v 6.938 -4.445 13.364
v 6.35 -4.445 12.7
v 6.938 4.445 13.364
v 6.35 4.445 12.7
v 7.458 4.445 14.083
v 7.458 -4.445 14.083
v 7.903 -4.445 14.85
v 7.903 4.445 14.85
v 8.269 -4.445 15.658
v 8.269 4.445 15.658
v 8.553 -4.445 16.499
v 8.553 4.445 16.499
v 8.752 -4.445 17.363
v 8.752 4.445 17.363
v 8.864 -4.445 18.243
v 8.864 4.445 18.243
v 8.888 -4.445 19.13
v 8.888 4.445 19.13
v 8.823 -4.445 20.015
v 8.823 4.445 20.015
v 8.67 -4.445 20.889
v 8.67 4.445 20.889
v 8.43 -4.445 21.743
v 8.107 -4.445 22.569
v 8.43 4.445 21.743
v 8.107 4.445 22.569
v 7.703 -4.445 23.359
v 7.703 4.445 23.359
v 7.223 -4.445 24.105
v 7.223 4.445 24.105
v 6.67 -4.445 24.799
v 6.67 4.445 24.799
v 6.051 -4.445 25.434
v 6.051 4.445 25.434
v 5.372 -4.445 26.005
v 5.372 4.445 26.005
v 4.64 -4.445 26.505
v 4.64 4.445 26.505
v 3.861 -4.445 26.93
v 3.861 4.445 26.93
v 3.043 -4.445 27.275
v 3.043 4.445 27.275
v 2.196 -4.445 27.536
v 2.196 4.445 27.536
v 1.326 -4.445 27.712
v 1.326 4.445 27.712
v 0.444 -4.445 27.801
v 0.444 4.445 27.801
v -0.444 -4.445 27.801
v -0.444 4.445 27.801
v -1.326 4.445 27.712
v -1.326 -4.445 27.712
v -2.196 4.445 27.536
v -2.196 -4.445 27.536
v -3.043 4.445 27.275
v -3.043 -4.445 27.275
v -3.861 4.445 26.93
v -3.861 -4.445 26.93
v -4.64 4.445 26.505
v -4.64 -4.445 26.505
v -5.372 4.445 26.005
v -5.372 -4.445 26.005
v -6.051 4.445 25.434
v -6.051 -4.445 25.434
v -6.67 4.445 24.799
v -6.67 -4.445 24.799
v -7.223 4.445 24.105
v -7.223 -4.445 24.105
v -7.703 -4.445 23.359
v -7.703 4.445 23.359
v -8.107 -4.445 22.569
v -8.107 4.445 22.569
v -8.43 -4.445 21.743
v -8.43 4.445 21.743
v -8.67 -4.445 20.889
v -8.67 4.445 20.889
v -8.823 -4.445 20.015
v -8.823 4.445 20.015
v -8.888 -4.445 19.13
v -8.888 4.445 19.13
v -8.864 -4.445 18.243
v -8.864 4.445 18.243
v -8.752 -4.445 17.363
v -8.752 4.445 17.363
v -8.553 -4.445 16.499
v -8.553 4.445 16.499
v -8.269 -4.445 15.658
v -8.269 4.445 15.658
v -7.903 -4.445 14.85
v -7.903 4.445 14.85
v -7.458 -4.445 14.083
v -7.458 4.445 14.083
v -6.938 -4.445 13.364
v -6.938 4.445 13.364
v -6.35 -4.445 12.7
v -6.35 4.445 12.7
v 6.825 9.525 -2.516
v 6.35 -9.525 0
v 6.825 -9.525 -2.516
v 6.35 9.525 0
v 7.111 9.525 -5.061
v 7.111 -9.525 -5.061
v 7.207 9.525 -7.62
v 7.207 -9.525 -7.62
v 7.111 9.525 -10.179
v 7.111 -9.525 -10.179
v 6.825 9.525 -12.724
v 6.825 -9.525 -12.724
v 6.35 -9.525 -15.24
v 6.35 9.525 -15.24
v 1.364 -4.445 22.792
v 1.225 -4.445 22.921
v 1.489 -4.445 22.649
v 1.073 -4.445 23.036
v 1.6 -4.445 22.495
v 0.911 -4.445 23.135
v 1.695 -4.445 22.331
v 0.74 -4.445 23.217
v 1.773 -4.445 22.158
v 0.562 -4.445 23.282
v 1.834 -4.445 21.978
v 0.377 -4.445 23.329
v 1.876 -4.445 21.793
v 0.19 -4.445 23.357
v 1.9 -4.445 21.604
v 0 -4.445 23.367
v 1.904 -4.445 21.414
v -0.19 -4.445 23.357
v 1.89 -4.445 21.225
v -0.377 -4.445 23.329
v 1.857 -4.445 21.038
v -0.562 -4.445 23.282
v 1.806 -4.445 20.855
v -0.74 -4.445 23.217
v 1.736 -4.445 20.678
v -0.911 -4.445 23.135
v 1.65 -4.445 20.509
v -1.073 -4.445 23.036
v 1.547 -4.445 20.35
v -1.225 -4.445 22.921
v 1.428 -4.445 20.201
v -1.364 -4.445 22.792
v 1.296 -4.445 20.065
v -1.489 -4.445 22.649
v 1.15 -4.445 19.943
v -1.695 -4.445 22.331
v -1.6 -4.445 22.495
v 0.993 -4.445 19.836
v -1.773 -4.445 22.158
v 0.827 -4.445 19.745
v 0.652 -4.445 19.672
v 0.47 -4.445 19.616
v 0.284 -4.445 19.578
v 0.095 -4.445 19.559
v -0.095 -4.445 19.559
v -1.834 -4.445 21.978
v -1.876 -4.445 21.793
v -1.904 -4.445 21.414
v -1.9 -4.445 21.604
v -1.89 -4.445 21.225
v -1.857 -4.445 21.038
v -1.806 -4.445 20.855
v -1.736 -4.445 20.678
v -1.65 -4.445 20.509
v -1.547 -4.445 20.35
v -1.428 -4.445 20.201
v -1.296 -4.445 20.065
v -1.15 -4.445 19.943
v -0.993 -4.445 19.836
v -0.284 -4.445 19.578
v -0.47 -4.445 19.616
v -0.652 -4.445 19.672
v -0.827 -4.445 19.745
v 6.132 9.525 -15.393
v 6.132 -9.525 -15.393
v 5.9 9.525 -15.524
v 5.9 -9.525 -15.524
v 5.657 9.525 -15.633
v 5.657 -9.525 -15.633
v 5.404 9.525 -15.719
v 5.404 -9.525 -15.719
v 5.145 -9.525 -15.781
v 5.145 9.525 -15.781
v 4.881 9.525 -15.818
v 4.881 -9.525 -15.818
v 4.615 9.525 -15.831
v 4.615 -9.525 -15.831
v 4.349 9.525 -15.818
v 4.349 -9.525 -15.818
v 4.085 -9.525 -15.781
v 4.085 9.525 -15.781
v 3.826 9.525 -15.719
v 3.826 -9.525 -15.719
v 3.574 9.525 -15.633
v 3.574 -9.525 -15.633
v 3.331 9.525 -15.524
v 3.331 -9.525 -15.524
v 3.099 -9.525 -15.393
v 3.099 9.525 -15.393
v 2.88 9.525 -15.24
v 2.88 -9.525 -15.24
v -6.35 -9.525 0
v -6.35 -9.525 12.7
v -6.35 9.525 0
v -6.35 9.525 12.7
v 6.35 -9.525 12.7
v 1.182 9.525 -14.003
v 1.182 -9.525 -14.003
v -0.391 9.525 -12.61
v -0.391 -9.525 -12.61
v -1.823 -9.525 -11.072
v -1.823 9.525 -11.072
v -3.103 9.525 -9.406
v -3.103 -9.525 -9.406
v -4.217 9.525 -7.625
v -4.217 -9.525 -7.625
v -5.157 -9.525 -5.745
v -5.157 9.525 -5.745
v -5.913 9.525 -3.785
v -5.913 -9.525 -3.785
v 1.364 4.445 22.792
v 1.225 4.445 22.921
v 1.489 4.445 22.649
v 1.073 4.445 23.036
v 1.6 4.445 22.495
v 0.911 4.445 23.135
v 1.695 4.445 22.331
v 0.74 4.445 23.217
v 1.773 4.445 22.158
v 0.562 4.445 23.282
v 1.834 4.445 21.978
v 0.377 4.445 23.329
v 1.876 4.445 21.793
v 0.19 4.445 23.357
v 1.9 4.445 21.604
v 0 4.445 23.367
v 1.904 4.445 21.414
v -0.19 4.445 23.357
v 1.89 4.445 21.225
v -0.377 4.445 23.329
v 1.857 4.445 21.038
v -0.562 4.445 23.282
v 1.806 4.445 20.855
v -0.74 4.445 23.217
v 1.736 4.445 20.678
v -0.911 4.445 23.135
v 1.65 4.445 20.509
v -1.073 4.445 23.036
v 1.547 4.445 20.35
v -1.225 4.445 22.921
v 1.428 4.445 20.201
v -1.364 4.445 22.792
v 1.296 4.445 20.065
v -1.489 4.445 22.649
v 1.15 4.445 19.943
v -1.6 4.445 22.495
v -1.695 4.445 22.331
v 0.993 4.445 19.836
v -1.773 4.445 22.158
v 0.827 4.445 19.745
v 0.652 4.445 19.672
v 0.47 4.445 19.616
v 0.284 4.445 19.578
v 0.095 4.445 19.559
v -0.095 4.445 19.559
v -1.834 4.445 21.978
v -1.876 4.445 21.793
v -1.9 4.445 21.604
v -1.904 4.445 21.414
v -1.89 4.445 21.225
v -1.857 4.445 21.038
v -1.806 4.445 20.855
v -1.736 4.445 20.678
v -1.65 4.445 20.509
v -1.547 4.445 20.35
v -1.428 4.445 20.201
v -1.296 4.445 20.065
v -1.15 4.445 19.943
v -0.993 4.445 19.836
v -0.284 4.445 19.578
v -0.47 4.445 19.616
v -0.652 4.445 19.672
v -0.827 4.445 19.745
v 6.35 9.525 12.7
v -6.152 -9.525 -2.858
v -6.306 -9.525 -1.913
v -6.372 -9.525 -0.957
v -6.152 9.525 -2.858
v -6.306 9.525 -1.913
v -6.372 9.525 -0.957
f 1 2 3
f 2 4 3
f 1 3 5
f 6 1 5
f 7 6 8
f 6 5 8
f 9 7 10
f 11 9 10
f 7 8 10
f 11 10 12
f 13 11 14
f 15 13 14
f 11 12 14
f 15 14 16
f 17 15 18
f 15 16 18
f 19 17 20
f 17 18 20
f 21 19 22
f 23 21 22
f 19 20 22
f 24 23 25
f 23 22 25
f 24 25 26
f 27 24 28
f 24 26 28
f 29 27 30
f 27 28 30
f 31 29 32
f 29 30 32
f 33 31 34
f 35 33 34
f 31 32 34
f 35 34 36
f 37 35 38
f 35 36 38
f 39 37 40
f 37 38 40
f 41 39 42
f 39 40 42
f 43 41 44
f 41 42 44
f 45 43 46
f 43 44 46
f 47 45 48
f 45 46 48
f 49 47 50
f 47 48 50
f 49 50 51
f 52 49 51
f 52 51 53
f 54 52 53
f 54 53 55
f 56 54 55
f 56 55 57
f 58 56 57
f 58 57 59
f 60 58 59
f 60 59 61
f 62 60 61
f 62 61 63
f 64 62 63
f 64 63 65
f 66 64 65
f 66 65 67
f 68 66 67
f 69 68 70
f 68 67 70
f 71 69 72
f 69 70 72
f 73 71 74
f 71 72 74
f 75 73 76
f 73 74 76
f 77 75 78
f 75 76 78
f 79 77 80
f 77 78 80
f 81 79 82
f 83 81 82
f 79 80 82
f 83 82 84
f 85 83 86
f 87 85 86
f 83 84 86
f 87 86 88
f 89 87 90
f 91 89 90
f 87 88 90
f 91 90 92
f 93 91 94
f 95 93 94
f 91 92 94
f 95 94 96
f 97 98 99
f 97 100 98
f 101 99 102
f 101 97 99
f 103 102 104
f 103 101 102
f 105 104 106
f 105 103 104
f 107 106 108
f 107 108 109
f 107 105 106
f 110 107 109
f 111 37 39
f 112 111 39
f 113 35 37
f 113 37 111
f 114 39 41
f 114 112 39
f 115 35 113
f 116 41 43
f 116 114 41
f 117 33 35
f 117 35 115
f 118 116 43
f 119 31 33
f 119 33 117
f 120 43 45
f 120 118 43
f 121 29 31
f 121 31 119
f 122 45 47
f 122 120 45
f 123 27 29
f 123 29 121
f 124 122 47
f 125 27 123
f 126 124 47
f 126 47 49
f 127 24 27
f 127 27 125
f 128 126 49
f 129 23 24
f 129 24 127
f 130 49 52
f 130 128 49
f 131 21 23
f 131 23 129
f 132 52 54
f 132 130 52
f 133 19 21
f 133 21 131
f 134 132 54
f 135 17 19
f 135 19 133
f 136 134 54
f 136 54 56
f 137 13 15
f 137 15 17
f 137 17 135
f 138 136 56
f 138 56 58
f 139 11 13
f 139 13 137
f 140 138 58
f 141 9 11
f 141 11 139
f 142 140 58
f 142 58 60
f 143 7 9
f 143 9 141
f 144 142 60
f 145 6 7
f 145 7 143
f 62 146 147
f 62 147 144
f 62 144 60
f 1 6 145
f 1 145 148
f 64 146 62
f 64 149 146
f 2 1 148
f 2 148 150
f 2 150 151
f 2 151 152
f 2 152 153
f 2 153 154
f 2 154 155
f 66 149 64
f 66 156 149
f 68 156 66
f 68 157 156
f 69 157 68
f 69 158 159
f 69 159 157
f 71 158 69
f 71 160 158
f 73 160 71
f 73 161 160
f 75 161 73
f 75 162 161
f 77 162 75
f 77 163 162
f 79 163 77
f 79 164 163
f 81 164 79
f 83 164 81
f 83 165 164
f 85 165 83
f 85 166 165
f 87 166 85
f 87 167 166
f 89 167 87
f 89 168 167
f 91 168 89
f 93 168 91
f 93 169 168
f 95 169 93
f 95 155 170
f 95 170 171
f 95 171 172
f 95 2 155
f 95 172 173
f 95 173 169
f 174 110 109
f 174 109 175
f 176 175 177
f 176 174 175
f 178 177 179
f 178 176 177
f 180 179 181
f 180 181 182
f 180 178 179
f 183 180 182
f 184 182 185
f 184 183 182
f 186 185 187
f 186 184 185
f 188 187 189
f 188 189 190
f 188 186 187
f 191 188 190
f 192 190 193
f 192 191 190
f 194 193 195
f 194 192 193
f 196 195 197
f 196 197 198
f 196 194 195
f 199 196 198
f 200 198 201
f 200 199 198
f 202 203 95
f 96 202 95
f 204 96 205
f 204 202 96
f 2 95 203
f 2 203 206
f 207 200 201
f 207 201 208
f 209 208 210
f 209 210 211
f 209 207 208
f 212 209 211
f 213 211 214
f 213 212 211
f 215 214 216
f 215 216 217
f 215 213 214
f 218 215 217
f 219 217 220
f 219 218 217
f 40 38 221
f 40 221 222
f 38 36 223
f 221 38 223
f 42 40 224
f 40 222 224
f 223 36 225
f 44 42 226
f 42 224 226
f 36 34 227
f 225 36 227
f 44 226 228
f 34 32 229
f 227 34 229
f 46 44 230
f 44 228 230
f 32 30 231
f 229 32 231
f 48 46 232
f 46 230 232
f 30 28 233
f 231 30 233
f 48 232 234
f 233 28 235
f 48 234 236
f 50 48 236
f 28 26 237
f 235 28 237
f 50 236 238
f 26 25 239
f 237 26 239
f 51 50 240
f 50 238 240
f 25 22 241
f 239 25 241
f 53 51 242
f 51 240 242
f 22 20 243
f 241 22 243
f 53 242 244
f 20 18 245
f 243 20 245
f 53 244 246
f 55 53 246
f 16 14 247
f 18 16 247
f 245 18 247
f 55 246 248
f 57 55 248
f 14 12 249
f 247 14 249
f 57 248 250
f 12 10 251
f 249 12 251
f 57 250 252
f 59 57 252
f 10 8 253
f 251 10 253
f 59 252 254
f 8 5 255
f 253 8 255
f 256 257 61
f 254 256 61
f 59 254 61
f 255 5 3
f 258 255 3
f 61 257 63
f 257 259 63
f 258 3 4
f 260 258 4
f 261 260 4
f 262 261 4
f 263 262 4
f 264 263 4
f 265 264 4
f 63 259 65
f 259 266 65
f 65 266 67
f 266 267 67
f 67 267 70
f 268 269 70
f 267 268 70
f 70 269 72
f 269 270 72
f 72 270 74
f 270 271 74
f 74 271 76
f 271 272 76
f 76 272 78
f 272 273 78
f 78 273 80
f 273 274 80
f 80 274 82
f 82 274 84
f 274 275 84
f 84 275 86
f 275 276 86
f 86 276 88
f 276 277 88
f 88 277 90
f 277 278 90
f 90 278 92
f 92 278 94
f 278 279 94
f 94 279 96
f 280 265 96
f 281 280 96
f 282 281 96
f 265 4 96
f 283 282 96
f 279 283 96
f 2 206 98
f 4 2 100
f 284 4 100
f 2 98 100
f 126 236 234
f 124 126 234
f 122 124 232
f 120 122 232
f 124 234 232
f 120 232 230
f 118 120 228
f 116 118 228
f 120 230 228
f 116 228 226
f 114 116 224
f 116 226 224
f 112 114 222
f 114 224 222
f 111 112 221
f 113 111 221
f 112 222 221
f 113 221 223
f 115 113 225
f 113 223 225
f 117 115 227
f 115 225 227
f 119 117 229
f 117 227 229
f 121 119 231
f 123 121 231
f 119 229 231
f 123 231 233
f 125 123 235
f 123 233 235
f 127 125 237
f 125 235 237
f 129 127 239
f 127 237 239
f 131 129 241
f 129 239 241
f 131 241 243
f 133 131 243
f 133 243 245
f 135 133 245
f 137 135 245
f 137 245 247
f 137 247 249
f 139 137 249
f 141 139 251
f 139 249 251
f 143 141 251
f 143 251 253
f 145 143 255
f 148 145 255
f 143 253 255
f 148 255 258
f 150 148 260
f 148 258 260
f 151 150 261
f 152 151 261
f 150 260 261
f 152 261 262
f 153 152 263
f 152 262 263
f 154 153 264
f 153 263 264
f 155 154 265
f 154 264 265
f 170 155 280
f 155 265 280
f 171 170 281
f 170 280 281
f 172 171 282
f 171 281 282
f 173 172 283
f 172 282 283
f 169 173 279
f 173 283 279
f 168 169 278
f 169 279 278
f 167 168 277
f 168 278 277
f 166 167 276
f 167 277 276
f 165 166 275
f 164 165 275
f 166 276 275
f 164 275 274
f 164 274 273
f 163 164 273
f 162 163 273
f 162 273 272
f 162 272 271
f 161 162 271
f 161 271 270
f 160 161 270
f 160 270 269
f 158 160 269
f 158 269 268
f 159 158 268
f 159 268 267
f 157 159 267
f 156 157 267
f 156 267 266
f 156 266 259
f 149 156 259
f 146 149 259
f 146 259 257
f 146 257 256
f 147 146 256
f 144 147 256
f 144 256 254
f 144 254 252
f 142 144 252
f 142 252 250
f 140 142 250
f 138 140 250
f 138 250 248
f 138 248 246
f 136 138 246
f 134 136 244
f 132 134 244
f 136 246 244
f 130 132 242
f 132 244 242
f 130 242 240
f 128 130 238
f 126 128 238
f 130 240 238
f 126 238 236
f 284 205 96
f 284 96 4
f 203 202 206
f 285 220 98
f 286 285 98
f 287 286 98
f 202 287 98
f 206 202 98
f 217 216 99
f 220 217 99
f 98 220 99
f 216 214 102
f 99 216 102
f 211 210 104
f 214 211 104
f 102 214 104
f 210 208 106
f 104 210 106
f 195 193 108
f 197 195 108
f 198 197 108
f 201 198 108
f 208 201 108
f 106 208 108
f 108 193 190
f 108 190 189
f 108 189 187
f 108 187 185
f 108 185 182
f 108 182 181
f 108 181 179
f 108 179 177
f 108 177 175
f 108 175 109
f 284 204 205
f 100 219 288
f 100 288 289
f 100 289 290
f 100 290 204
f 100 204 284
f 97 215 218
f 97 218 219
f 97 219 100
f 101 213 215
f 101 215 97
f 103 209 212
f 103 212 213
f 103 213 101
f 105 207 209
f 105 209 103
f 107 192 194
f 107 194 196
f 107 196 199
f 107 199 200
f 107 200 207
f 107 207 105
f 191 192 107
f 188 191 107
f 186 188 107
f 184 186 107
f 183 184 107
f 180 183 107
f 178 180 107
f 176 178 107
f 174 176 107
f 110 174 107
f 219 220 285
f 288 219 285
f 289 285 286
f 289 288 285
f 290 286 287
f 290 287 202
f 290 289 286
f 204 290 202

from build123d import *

# Parameters (mm, degrees)
SKETCH1_W                = 12.7
SKETCH1_H                = 19.05
BOSS_EXTRUDE1_DEPTH      = 12.7
BOSS_EXTRUDE3_DEPTH      = 4.445
BOSS_EXTRUDE3_DEPTH_BACK = 14.605
BOSS_EXTRUDE5_DEPTH      = 4.445
SKETCH9_R                = 1.905
CUT_EXTRUDE1_DEPTH       = 8.89


with BuildPart() as part:
    # Sketch1 → Boss-Extrude1 (new body)
    with BuildSketch(Plane.XY):
        Rectangle(SKETCH1_W, SKETCH1_H)
    extrude(amount=BOSS_EXTRUDE1_DEPTH)

    # Sketch5 → Boss-Extrude3 (add, two sides)
    with BuildSketch(Plane(origin=(0, 5.08, 0), x_dir=(1, 0, 0), z_dir=(0, 1, 0))) as boss_extrude3_sk:
        with BuildLine():
            Line((-6.35, 0), (6.35, 0))
            ThreePointArc((6.35, 0), (7.206801568, 7.62), (6.35, 15.24))
            ThreePointArc((6.35, 15.24), (4.615153625, 15.830989255), (2.88030725, 15.24))
            ThreePointArc((2.88030725, 15.24), (-2.482813439, 10.254375056), (-5.912749562, 3.784826555))
            ThreePointArc((-5.912749562, 3.784826555), (-6.305841352, 1.912568913), (-6.35, 0))
        make_face()
    extrude(amount=BOSS_EXTRUDE3_DEPTH)
    extrude(boss_extrude3_sk.sketch, amount=-BOSS_EXTRUDE3_DEPTH_BACK)

    # Sketch8 → Boss-Extrude5 (add, symmetric)
    with BuildSketch(Plane(origin=(0, 0, 0), x_dir=(1, 0, 0), z_dir=(0, 1, 0))):
        with BuildLine():
            Line((-6.35, -12.7), (6.35, -12.7))
            ThreePointArc((6.35, -12.7), (0, -27.811703947), (-6.35, -12.7))
        make_face()
    extrude(amount=BOSS_EXTRUDE5_DEPTH, both=True)

    # Sketch9 → Cut-Extrude1 (cut)
    with BuildSketch(Plane(origin=(0, 4.445, 0), x_dir=(1, 0, 0), z_dir=(0, 1, 0))):
        with Locations(Location((0, -21.461703947, 0), (0, 0, 270))):  # turned: the seam where the file's is
            Circle(SKETCH9_R)
    extrude(amount=-CUT_EXTRUDE1_DEPTH, mode=Mode.SUBTRACT)


solid = part.part
